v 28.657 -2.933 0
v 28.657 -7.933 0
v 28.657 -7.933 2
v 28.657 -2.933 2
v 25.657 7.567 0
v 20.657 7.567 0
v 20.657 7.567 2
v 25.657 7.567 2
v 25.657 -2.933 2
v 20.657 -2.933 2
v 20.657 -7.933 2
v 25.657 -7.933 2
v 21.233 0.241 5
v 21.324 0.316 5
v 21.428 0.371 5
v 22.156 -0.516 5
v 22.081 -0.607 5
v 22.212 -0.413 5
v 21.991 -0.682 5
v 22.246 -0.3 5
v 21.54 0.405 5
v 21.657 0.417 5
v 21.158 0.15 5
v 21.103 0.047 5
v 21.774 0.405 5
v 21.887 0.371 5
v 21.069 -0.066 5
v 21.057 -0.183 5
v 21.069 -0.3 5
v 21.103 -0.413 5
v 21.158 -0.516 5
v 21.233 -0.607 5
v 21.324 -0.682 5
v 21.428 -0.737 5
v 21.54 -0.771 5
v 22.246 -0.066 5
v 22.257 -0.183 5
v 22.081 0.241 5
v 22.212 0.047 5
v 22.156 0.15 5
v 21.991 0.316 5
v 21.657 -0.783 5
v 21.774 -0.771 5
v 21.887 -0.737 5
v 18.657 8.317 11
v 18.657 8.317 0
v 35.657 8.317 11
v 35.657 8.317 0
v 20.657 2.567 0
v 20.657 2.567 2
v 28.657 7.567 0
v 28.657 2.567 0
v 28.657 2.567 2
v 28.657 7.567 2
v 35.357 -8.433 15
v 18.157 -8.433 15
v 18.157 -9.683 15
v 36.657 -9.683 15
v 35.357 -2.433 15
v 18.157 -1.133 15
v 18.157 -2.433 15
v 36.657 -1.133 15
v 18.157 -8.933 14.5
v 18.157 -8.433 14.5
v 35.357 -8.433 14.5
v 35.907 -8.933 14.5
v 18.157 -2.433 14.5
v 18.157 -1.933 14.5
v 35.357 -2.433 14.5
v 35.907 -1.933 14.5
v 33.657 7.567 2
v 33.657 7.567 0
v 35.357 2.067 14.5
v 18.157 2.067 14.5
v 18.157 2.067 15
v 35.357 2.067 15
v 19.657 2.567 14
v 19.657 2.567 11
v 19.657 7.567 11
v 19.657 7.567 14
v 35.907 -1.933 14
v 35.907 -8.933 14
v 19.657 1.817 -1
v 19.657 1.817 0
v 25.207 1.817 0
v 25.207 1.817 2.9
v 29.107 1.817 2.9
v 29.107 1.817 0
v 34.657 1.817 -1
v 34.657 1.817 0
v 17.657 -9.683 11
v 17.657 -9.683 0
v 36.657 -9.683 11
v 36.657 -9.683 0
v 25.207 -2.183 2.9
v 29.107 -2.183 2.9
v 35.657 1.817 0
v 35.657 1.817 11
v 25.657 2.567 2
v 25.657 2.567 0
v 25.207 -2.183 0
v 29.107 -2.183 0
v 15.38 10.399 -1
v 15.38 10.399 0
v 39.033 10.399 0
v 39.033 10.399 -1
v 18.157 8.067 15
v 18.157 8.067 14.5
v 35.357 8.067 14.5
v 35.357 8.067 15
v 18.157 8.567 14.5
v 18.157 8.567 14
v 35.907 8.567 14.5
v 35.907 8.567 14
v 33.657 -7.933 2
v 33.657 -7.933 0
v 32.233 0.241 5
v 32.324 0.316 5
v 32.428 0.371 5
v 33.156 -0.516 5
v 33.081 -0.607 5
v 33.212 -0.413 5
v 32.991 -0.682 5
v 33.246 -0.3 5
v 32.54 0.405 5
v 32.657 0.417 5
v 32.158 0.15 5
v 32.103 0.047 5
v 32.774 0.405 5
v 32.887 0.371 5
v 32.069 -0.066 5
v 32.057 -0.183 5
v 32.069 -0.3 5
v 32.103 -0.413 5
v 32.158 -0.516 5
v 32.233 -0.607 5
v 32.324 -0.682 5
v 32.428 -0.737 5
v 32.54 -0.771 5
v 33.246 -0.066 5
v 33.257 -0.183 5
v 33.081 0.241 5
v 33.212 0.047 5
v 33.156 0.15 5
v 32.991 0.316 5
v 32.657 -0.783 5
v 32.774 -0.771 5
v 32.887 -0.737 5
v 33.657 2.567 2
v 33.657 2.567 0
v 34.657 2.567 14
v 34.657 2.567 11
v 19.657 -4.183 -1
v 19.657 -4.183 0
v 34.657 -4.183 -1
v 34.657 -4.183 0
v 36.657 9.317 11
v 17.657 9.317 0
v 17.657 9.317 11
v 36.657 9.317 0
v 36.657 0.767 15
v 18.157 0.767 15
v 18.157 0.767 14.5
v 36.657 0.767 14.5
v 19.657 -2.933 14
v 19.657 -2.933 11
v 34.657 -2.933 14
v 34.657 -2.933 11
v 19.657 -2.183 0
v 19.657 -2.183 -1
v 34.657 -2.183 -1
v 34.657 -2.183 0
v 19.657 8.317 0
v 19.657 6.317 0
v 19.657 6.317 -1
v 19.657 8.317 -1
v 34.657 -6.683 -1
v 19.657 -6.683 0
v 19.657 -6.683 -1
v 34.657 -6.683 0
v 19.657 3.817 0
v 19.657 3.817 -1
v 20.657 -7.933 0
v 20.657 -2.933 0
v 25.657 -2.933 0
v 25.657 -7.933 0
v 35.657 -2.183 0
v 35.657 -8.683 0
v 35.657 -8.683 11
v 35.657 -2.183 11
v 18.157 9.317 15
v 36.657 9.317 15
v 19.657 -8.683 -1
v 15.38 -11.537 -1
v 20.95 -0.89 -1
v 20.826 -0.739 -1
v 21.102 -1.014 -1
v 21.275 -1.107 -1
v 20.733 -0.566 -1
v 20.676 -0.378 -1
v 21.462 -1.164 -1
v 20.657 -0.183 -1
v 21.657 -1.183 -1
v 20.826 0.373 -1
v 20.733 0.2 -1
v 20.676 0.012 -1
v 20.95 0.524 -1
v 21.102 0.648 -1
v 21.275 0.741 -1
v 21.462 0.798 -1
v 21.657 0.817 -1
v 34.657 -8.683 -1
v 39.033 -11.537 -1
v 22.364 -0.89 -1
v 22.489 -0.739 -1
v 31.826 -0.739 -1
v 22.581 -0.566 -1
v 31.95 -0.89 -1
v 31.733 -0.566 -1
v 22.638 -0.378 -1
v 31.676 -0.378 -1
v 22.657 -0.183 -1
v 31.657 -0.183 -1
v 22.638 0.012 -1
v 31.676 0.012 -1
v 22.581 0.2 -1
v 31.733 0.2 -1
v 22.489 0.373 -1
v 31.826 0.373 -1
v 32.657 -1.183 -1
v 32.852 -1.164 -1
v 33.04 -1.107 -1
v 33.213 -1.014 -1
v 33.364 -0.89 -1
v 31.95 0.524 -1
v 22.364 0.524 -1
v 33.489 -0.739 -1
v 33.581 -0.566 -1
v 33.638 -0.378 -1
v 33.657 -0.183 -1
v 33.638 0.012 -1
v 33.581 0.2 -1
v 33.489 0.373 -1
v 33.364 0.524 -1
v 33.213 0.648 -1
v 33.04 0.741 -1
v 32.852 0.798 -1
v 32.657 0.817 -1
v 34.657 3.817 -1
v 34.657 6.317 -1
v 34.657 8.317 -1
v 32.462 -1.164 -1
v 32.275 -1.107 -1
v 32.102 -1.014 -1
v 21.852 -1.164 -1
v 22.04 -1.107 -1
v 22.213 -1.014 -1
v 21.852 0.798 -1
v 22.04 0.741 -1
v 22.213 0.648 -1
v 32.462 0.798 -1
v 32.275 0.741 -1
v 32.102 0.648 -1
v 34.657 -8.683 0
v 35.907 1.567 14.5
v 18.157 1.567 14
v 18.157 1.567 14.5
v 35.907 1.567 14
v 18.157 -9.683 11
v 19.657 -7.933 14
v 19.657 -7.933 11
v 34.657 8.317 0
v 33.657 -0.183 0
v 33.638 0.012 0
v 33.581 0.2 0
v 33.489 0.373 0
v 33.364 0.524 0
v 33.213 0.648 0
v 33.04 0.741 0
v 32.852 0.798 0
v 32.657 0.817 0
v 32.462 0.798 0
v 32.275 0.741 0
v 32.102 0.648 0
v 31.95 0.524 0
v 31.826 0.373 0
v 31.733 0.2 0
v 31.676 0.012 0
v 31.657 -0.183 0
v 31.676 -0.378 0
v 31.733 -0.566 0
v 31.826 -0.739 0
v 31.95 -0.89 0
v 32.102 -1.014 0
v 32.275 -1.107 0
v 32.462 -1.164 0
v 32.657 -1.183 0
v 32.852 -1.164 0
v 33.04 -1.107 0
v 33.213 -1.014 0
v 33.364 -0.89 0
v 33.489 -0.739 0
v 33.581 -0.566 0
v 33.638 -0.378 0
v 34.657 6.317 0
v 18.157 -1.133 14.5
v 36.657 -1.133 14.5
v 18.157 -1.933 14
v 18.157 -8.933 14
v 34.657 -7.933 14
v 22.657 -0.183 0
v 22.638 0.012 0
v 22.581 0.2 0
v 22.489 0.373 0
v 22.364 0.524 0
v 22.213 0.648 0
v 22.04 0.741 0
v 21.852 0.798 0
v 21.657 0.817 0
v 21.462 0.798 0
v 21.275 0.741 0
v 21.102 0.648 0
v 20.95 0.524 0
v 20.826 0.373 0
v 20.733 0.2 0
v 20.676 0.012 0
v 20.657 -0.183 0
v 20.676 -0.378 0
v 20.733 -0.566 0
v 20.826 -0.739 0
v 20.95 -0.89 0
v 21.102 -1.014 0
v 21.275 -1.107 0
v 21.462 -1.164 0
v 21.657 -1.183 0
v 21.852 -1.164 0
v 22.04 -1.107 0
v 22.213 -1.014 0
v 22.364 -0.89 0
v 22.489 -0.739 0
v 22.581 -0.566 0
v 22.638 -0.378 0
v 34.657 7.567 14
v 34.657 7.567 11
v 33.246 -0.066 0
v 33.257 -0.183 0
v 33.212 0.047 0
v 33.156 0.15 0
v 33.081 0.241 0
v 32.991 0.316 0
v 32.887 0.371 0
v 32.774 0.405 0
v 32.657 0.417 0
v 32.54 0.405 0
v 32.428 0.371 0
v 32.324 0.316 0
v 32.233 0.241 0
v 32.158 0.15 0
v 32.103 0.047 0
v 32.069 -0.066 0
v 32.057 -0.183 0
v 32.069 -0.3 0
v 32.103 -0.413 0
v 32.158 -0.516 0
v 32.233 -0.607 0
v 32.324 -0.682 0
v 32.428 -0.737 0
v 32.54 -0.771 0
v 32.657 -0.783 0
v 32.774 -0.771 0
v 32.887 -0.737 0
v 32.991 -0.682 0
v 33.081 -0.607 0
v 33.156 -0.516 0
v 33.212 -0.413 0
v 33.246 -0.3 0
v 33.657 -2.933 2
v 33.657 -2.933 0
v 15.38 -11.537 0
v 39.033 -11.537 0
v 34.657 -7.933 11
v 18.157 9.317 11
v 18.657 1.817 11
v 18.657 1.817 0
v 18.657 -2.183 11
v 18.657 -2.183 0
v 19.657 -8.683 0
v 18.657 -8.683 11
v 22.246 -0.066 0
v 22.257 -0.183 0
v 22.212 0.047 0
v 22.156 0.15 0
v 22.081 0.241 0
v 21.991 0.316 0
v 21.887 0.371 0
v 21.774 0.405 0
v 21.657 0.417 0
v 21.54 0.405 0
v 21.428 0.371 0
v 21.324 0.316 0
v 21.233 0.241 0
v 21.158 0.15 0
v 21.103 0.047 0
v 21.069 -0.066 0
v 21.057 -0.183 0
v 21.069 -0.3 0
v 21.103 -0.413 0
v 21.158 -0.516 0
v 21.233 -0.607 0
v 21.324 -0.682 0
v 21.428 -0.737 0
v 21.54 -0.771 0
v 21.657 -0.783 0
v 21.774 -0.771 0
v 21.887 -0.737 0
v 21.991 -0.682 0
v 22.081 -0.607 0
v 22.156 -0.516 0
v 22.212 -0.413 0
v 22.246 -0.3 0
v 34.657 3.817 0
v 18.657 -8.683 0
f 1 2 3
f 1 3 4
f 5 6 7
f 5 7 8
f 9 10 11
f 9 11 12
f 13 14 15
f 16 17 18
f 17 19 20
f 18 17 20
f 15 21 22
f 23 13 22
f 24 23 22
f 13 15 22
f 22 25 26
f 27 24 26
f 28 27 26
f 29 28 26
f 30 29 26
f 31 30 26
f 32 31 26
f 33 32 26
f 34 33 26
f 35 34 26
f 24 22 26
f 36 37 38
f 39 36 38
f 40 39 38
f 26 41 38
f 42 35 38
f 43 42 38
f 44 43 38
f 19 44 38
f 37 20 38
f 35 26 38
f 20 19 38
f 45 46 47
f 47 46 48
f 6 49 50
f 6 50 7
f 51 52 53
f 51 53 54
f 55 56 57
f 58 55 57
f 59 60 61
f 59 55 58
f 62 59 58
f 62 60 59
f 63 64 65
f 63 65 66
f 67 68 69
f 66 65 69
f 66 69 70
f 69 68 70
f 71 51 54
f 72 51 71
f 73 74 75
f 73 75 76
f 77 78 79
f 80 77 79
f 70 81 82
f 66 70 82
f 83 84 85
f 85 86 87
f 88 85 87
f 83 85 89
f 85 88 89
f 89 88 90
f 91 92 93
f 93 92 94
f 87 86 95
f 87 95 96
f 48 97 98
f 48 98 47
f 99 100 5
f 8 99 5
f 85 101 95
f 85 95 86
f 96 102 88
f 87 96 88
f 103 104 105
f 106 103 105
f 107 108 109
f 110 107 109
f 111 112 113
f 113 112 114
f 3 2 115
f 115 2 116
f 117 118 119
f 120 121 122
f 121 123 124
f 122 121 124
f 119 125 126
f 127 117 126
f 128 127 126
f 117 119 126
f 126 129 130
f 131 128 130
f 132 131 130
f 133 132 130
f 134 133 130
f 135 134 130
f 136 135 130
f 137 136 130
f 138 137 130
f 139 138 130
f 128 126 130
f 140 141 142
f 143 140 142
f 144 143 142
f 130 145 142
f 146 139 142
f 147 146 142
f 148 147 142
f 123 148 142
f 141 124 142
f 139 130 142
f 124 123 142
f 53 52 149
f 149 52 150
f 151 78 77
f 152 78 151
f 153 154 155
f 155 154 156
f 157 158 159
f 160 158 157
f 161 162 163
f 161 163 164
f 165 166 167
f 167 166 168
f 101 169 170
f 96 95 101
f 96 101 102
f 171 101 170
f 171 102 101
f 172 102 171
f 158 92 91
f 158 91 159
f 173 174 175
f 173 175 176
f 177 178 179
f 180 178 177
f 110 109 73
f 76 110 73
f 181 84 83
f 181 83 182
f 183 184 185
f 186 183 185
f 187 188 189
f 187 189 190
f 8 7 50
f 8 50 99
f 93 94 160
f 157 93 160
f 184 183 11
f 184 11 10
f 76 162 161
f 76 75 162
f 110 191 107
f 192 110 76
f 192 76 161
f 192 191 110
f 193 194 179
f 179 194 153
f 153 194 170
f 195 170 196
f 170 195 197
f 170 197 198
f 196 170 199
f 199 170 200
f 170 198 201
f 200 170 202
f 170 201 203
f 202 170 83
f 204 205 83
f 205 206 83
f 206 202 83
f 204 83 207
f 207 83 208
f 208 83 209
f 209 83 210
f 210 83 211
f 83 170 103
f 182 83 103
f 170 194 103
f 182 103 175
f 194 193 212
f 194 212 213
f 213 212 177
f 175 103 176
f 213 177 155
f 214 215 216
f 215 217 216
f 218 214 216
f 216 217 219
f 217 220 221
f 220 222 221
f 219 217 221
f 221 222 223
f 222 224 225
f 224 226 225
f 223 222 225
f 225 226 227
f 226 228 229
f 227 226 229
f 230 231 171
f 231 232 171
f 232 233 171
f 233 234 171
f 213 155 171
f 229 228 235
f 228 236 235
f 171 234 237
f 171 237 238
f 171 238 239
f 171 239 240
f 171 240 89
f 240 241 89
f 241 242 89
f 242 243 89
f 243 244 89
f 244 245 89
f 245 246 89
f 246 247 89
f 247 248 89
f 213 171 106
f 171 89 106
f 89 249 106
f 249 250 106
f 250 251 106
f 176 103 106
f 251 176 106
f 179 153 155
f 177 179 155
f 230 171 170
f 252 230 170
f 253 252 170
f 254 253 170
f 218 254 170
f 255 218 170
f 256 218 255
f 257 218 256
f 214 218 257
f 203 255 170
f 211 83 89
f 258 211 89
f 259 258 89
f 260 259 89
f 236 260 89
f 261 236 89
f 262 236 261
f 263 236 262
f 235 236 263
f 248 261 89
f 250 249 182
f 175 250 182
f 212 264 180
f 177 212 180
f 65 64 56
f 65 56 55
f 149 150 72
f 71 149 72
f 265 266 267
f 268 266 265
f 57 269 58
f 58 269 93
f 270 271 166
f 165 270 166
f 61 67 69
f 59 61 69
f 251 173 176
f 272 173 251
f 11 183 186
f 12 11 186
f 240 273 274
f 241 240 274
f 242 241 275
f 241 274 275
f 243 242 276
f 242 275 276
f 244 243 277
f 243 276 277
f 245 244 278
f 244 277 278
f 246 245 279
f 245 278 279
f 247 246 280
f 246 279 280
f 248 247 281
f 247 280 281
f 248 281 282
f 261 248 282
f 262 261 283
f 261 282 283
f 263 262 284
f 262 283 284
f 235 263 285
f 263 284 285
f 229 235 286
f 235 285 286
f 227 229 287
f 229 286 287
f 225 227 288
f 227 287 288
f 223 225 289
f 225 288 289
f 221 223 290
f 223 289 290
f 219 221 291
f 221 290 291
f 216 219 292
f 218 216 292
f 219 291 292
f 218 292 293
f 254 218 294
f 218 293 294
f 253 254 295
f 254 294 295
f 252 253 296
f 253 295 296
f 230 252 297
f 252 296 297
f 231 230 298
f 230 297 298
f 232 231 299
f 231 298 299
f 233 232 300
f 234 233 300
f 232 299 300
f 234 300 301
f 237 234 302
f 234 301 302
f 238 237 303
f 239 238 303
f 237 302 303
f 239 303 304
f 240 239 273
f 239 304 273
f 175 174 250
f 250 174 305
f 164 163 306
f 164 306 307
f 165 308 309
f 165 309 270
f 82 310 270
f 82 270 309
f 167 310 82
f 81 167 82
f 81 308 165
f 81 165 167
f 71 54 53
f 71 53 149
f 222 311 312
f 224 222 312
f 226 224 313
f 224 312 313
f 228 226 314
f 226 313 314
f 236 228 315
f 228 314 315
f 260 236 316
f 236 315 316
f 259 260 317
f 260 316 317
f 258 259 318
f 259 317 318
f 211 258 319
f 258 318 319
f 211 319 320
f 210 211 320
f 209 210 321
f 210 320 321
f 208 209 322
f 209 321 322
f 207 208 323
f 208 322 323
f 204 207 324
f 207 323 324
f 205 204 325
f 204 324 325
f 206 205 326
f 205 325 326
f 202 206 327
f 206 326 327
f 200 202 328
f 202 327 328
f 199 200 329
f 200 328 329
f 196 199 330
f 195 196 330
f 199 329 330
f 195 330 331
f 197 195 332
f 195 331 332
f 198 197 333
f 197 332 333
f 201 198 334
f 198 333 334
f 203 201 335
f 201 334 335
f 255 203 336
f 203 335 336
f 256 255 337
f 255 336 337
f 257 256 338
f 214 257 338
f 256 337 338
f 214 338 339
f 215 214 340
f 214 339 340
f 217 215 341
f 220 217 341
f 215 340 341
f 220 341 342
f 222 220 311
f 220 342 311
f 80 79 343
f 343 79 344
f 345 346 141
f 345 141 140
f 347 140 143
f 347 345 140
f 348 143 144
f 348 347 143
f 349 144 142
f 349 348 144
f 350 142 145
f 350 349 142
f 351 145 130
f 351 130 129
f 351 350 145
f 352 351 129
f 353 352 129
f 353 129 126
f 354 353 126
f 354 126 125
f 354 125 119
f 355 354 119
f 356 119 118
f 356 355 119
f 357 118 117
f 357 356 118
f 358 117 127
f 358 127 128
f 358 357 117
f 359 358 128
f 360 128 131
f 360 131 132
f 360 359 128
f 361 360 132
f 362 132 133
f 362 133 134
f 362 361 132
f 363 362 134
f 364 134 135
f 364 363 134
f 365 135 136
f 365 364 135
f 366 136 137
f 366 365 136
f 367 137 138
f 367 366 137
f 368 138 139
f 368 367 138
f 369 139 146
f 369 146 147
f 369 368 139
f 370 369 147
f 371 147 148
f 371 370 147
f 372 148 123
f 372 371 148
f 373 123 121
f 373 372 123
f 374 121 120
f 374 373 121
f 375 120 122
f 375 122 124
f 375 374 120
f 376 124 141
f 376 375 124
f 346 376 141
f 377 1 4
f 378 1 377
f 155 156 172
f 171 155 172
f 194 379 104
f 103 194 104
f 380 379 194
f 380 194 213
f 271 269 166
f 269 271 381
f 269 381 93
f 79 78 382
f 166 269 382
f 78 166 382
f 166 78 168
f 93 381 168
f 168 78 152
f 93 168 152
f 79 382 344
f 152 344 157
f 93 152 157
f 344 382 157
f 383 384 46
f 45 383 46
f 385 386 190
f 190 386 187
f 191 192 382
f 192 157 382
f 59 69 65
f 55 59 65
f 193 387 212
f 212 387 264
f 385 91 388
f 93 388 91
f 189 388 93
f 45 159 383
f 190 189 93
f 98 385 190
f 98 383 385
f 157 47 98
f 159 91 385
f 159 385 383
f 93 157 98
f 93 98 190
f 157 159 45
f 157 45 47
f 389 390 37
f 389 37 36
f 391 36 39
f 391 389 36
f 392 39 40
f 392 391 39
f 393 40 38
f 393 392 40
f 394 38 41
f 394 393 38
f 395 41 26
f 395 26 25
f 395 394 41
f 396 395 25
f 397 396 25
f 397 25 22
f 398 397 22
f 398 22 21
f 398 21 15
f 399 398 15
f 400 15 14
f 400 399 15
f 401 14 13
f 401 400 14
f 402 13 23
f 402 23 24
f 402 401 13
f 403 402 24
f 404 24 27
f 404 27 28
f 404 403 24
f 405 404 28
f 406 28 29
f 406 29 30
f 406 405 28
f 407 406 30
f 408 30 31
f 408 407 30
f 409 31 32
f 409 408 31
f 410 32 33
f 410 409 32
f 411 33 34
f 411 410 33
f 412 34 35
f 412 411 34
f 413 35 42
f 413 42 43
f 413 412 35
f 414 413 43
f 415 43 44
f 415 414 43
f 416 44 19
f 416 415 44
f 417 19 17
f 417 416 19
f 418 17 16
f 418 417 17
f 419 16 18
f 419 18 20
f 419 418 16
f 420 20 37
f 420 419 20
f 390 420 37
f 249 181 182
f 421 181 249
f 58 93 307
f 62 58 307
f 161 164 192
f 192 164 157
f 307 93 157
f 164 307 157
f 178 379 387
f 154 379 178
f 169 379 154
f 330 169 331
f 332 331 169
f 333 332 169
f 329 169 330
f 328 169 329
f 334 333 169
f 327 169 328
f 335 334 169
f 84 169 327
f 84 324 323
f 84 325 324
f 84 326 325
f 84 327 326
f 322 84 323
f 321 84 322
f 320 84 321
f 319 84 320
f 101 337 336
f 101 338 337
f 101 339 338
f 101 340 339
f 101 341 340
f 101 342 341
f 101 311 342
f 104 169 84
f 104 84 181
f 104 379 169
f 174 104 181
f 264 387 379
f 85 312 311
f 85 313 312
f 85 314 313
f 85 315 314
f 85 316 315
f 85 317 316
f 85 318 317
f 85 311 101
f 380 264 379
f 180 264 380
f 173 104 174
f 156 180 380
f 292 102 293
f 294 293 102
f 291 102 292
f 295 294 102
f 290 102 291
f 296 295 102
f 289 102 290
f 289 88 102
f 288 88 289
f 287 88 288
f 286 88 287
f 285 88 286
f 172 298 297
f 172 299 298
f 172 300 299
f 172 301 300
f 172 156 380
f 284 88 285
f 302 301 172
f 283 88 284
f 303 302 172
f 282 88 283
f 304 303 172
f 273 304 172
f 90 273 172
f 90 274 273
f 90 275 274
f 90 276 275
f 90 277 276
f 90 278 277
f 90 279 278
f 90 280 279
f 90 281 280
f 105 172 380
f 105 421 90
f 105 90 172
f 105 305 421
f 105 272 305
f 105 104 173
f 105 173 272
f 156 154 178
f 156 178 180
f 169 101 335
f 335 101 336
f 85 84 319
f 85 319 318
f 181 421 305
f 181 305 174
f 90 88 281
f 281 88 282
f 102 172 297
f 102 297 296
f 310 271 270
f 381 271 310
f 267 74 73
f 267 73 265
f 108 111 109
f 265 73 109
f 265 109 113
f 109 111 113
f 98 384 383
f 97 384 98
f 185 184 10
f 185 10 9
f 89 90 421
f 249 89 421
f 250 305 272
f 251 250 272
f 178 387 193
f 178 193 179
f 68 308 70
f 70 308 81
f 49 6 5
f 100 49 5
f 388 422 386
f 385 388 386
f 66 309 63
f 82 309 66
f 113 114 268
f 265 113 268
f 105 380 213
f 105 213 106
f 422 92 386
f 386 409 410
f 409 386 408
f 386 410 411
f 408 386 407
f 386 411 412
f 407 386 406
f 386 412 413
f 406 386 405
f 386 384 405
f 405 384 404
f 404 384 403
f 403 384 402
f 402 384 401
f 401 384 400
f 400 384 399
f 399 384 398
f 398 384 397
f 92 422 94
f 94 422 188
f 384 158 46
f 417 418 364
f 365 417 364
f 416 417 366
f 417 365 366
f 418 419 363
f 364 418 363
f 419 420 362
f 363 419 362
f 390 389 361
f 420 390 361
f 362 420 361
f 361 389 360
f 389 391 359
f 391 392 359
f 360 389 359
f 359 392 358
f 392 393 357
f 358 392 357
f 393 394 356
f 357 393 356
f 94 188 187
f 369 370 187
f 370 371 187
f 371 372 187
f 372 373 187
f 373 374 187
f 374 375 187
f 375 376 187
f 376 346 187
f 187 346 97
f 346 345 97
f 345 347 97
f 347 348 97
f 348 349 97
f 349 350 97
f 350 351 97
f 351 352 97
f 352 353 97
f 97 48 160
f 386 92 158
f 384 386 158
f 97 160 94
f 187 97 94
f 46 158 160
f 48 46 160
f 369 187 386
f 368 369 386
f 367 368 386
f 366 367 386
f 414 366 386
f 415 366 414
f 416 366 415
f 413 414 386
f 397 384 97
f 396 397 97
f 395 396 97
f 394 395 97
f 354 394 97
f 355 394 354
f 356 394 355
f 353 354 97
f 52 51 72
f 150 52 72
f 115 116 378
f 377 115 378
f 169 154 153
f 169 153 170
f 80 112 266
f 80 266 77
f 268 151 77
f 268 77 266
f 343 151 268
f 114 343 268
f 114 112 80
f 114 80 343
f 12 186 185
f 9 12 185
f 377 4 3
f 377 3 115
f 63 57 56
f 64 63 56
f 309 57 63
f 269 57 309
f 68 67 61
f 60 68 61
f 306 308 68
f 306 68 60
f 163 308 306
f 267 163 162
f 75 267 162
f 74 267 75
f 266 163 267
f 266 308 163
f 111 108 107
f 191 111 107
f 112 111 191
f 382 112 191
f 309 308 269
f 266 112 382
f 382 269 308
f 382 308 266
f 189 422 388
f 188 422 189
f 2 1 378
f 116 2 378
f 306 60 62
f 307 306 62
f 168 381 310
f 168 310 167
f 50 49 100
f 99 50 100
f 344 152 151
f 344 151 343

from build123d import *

# Parameters (mm, degrees)
F0_W      = 19
F0_H      = 19
F0_W_2    = 17
F0_H_2    = 6.5
F1_DEPTH  = 11
F2_W      = 5
F2_H      = 5
F3_DEPTH  = 2
F4_W      = 18.5
F4_H      = 19
F4_W_2    = 15
F4_H_2    = 5
F5_DEPTH  = 3
F6_W      = 17.75
F6_H      = 0.75
F6_H_2    = 3.5
F7_DEPTH  = 0.5
F8_W      = 17.2
F8_H      = 1.25
F8_H_2    = 4.5
F9_DEPTH  = 0.5
F10_W     = 18.5
F10_H     = 1.9
F11_DEPTH = 0.5
F12_W     = 23.653655313
F12_H     = 21.9355393201
F12_W_2   = 15
F12_H_2   = 2
F12_R     = 1
F13_DEPTH = 1
F14_W     = 3.9
F14_H     = 4
F15_DEPTH = 2.9
F16_R     = 0.6
F17_DEPTH = 5


with BuildPart() as f1:
    # F0 (on Top) → F1 (new body)
    with BuildSketch(Plane.XY):
        with Locations((27.1572303065, -0.1830193214)):
            Rectangle(F0_W, F0_H)
        with Locations((27.1572303065, -5.4330193214)):
            Rectangle(F0_W_2, F0_H_2, mode=Mode.SUBTRACT)
        with Locations((27.1572303065, 5.0669806786)):
            Rectangle(F0_W_2, F0_H_2, mode=Mode.SUBTRACT)
    extrude(amount=F1_DEPTH)

    # F16 (on face) → F17 (cut)
    with BuildSketch(Plane.XY):
        with Locations((21.6572303065, -0.1830193214)):
            Circle(F16_R)
        with Locations((32.6572303065, -0.1830193214)):
            Circle(F16_R)
    extrude(amount=F17_DEPTH, mode=Mode.SUBTRACT)


with BuildPart() as f3:
    # F2 (on Top) → F3 (new body)
    with BuildSketch(Plane.XY):
        with Locations((23.1572303065, 5.0669806786)):
            Rectangle(F2_W, F2_H)
    extrude(amount=F3_DEPTH)


with BuildPart() as f3b:
    # F2 (on Top) → F3, piece 2 (new body)
    with BuildSketch(Plane.XY):
        with Locations((23.1572303065, -5.4330193214)):
            Rectangle(F2_W, F2_H)
    extrude(amount=F3_DEPTH)


with BuildPart() as f3c:
    # F2 (on Top) → F3, piece 3 (new body)
    with BuildSketch(Plane.XY):
        with Locations((31.1572303065, 5.0669806786)):
            Rectangle(F2_W, F2_H)
    extrude(amount=F3_DEPTH)


with BuildPart() as f3d:
    # F2 (on Top) → F3, piece 4 (new body)
    with BuildSketch(Plane.XY):
        with Locations((31.1572303065, -5.4330193214)):
            Rectangle(F2_W, F2_H)
    extrude(amount=F3_DEPTH)


with BuildPart() as f5:
    # F4 (on face) → F5 (new body)
    with BuildSketch(Plane.XY.offset(11)):
        with Locations((27.4072303065, -0.1830193214)):
            Rectangle(F4_W, F4_H)
        with Locations((27.1572303065, -5.4330193214)):
            Rectangle(F4_W_2, F4_H_2, mode=Mode.SUBTRACT)
        with Locations((27.1572303065, 5.0669806786)):
            Rectangle(F4_W_2, F4_H_2, mode=Mode.SUBTRACT)
    extrude(amount=F5_DEPTH)

    # F6 (on face) → F7 (join)
    with BuildSketch(Plane.XY.offset(14)):
        Polygon((36.6572303065, -9.6830193214), (36.6572303065, 9.3169806786), (35.9072303065, 9.3169806786), (35.9072303065, 8.5669806786), (35.9072303065, 1.5669806786), (35.9072303065, -1.9330193214), (35.9072303065, -8.9330193214), (35.9072303065, -9.6830193214), align=None)
        with Locations((27.0322303065, 8.9419806786)):
            Rectangle(F6_W, F6_H)
        with Locations((27.0322303065, -9.3080193214)):
            Rectangle(F6_W, F6_H)
        with Locations((27.0322303065, -0.1830193214)):
            Rectangle(F6_W, F6_H_2)
    extrude(amount=F7_DEPTH)

    # F8 (on face) → F9 (join)
    with BuildSketch(Plane.XY.offset(14.5)):
        Polygon((36.6572303065, -9.6830193214), (36.6572303065, 9.3169806786), (35.3572303065, 9.3169806786), (35.3572303065, 8.0669806786), (35.3572303065, 2.0669806786), (35.3572303065, -2.4330193214), (35.3572303065, -8.4330193214), (35.3572303065, -9.6830193214), align=None)
        with Locations((26.7572303065, 8.6919806786)):
            Rectangle(F8_W, F8_H)
        with Locations((26.7572303065, -9.0580193214)):
            Rectangle(F8_W, F8_H)
        with Locations((26.7572303065, -0.1830193214)):
            Rectangle(F8_W, F8_H_2)
    extrude(amount=F9_DEPTH)

    # F10 (on face) → F11 (cut)
    with BuildSketch(Plane.XY.offset(15)):
        with Locations((27.4072303065, -0.1830193214)):
            Rectangle(F10_W, F10_H)
    extrude(amount=-F11_DEPTH, mode=Mode.SUBTRACT)


with BuildPart() as f13:
    # F12 (on Top) → F13 (new body)
    with BuildSketch(Plane.XY):
        with Locations((27.2063766606, -0.5692541599)):
            Rectangle(F12_W, F12_H)
        with Locations((27.1572303065, -7.6830193214)):
            Rectangle(F12_W_2, F12_H_2, mode=Mode.SUBTRACT)
        with Locations((27.1572303065, -3.1830193214)):
            Rectangle(F12_W_2, F12_H_2, mode=Mode.SUBTRACT)
        with Locations((21.6572303065, -0.1830193214)):
            Circle(F12_R, mode=Mode.SUBTRACT)
        with Locations((27.1572303065, 2.8169806786)):
            Rectangle(F12_W_2, F12_H_2, mode=Mode.SUBTRACT)
        with Locations((27.1572303065, 7.3169806786)):
            Rectangle(F12_W_2, F12_H_2, mode=Mode.SUBTRACT)
        with Locations((32.6572303065, -0.1830193214)):
            Circle(F12_R, mode=Mode.SUBTRACT)
    extrude(amount=-F13_DEPTH)

    # F14 (on face) → F15 (join)
    with BuildSketch(Plane.XY):
        with Locations((27.1572303065, -0.1830193214)):
            Rectangle(F14_W, F14_H)
    extrude(amount=F15_DEPTH)


solid = Compound([f1.part, f3.part, f3b.part, f3c.part, f3d.part, f5.part, f13.part])
